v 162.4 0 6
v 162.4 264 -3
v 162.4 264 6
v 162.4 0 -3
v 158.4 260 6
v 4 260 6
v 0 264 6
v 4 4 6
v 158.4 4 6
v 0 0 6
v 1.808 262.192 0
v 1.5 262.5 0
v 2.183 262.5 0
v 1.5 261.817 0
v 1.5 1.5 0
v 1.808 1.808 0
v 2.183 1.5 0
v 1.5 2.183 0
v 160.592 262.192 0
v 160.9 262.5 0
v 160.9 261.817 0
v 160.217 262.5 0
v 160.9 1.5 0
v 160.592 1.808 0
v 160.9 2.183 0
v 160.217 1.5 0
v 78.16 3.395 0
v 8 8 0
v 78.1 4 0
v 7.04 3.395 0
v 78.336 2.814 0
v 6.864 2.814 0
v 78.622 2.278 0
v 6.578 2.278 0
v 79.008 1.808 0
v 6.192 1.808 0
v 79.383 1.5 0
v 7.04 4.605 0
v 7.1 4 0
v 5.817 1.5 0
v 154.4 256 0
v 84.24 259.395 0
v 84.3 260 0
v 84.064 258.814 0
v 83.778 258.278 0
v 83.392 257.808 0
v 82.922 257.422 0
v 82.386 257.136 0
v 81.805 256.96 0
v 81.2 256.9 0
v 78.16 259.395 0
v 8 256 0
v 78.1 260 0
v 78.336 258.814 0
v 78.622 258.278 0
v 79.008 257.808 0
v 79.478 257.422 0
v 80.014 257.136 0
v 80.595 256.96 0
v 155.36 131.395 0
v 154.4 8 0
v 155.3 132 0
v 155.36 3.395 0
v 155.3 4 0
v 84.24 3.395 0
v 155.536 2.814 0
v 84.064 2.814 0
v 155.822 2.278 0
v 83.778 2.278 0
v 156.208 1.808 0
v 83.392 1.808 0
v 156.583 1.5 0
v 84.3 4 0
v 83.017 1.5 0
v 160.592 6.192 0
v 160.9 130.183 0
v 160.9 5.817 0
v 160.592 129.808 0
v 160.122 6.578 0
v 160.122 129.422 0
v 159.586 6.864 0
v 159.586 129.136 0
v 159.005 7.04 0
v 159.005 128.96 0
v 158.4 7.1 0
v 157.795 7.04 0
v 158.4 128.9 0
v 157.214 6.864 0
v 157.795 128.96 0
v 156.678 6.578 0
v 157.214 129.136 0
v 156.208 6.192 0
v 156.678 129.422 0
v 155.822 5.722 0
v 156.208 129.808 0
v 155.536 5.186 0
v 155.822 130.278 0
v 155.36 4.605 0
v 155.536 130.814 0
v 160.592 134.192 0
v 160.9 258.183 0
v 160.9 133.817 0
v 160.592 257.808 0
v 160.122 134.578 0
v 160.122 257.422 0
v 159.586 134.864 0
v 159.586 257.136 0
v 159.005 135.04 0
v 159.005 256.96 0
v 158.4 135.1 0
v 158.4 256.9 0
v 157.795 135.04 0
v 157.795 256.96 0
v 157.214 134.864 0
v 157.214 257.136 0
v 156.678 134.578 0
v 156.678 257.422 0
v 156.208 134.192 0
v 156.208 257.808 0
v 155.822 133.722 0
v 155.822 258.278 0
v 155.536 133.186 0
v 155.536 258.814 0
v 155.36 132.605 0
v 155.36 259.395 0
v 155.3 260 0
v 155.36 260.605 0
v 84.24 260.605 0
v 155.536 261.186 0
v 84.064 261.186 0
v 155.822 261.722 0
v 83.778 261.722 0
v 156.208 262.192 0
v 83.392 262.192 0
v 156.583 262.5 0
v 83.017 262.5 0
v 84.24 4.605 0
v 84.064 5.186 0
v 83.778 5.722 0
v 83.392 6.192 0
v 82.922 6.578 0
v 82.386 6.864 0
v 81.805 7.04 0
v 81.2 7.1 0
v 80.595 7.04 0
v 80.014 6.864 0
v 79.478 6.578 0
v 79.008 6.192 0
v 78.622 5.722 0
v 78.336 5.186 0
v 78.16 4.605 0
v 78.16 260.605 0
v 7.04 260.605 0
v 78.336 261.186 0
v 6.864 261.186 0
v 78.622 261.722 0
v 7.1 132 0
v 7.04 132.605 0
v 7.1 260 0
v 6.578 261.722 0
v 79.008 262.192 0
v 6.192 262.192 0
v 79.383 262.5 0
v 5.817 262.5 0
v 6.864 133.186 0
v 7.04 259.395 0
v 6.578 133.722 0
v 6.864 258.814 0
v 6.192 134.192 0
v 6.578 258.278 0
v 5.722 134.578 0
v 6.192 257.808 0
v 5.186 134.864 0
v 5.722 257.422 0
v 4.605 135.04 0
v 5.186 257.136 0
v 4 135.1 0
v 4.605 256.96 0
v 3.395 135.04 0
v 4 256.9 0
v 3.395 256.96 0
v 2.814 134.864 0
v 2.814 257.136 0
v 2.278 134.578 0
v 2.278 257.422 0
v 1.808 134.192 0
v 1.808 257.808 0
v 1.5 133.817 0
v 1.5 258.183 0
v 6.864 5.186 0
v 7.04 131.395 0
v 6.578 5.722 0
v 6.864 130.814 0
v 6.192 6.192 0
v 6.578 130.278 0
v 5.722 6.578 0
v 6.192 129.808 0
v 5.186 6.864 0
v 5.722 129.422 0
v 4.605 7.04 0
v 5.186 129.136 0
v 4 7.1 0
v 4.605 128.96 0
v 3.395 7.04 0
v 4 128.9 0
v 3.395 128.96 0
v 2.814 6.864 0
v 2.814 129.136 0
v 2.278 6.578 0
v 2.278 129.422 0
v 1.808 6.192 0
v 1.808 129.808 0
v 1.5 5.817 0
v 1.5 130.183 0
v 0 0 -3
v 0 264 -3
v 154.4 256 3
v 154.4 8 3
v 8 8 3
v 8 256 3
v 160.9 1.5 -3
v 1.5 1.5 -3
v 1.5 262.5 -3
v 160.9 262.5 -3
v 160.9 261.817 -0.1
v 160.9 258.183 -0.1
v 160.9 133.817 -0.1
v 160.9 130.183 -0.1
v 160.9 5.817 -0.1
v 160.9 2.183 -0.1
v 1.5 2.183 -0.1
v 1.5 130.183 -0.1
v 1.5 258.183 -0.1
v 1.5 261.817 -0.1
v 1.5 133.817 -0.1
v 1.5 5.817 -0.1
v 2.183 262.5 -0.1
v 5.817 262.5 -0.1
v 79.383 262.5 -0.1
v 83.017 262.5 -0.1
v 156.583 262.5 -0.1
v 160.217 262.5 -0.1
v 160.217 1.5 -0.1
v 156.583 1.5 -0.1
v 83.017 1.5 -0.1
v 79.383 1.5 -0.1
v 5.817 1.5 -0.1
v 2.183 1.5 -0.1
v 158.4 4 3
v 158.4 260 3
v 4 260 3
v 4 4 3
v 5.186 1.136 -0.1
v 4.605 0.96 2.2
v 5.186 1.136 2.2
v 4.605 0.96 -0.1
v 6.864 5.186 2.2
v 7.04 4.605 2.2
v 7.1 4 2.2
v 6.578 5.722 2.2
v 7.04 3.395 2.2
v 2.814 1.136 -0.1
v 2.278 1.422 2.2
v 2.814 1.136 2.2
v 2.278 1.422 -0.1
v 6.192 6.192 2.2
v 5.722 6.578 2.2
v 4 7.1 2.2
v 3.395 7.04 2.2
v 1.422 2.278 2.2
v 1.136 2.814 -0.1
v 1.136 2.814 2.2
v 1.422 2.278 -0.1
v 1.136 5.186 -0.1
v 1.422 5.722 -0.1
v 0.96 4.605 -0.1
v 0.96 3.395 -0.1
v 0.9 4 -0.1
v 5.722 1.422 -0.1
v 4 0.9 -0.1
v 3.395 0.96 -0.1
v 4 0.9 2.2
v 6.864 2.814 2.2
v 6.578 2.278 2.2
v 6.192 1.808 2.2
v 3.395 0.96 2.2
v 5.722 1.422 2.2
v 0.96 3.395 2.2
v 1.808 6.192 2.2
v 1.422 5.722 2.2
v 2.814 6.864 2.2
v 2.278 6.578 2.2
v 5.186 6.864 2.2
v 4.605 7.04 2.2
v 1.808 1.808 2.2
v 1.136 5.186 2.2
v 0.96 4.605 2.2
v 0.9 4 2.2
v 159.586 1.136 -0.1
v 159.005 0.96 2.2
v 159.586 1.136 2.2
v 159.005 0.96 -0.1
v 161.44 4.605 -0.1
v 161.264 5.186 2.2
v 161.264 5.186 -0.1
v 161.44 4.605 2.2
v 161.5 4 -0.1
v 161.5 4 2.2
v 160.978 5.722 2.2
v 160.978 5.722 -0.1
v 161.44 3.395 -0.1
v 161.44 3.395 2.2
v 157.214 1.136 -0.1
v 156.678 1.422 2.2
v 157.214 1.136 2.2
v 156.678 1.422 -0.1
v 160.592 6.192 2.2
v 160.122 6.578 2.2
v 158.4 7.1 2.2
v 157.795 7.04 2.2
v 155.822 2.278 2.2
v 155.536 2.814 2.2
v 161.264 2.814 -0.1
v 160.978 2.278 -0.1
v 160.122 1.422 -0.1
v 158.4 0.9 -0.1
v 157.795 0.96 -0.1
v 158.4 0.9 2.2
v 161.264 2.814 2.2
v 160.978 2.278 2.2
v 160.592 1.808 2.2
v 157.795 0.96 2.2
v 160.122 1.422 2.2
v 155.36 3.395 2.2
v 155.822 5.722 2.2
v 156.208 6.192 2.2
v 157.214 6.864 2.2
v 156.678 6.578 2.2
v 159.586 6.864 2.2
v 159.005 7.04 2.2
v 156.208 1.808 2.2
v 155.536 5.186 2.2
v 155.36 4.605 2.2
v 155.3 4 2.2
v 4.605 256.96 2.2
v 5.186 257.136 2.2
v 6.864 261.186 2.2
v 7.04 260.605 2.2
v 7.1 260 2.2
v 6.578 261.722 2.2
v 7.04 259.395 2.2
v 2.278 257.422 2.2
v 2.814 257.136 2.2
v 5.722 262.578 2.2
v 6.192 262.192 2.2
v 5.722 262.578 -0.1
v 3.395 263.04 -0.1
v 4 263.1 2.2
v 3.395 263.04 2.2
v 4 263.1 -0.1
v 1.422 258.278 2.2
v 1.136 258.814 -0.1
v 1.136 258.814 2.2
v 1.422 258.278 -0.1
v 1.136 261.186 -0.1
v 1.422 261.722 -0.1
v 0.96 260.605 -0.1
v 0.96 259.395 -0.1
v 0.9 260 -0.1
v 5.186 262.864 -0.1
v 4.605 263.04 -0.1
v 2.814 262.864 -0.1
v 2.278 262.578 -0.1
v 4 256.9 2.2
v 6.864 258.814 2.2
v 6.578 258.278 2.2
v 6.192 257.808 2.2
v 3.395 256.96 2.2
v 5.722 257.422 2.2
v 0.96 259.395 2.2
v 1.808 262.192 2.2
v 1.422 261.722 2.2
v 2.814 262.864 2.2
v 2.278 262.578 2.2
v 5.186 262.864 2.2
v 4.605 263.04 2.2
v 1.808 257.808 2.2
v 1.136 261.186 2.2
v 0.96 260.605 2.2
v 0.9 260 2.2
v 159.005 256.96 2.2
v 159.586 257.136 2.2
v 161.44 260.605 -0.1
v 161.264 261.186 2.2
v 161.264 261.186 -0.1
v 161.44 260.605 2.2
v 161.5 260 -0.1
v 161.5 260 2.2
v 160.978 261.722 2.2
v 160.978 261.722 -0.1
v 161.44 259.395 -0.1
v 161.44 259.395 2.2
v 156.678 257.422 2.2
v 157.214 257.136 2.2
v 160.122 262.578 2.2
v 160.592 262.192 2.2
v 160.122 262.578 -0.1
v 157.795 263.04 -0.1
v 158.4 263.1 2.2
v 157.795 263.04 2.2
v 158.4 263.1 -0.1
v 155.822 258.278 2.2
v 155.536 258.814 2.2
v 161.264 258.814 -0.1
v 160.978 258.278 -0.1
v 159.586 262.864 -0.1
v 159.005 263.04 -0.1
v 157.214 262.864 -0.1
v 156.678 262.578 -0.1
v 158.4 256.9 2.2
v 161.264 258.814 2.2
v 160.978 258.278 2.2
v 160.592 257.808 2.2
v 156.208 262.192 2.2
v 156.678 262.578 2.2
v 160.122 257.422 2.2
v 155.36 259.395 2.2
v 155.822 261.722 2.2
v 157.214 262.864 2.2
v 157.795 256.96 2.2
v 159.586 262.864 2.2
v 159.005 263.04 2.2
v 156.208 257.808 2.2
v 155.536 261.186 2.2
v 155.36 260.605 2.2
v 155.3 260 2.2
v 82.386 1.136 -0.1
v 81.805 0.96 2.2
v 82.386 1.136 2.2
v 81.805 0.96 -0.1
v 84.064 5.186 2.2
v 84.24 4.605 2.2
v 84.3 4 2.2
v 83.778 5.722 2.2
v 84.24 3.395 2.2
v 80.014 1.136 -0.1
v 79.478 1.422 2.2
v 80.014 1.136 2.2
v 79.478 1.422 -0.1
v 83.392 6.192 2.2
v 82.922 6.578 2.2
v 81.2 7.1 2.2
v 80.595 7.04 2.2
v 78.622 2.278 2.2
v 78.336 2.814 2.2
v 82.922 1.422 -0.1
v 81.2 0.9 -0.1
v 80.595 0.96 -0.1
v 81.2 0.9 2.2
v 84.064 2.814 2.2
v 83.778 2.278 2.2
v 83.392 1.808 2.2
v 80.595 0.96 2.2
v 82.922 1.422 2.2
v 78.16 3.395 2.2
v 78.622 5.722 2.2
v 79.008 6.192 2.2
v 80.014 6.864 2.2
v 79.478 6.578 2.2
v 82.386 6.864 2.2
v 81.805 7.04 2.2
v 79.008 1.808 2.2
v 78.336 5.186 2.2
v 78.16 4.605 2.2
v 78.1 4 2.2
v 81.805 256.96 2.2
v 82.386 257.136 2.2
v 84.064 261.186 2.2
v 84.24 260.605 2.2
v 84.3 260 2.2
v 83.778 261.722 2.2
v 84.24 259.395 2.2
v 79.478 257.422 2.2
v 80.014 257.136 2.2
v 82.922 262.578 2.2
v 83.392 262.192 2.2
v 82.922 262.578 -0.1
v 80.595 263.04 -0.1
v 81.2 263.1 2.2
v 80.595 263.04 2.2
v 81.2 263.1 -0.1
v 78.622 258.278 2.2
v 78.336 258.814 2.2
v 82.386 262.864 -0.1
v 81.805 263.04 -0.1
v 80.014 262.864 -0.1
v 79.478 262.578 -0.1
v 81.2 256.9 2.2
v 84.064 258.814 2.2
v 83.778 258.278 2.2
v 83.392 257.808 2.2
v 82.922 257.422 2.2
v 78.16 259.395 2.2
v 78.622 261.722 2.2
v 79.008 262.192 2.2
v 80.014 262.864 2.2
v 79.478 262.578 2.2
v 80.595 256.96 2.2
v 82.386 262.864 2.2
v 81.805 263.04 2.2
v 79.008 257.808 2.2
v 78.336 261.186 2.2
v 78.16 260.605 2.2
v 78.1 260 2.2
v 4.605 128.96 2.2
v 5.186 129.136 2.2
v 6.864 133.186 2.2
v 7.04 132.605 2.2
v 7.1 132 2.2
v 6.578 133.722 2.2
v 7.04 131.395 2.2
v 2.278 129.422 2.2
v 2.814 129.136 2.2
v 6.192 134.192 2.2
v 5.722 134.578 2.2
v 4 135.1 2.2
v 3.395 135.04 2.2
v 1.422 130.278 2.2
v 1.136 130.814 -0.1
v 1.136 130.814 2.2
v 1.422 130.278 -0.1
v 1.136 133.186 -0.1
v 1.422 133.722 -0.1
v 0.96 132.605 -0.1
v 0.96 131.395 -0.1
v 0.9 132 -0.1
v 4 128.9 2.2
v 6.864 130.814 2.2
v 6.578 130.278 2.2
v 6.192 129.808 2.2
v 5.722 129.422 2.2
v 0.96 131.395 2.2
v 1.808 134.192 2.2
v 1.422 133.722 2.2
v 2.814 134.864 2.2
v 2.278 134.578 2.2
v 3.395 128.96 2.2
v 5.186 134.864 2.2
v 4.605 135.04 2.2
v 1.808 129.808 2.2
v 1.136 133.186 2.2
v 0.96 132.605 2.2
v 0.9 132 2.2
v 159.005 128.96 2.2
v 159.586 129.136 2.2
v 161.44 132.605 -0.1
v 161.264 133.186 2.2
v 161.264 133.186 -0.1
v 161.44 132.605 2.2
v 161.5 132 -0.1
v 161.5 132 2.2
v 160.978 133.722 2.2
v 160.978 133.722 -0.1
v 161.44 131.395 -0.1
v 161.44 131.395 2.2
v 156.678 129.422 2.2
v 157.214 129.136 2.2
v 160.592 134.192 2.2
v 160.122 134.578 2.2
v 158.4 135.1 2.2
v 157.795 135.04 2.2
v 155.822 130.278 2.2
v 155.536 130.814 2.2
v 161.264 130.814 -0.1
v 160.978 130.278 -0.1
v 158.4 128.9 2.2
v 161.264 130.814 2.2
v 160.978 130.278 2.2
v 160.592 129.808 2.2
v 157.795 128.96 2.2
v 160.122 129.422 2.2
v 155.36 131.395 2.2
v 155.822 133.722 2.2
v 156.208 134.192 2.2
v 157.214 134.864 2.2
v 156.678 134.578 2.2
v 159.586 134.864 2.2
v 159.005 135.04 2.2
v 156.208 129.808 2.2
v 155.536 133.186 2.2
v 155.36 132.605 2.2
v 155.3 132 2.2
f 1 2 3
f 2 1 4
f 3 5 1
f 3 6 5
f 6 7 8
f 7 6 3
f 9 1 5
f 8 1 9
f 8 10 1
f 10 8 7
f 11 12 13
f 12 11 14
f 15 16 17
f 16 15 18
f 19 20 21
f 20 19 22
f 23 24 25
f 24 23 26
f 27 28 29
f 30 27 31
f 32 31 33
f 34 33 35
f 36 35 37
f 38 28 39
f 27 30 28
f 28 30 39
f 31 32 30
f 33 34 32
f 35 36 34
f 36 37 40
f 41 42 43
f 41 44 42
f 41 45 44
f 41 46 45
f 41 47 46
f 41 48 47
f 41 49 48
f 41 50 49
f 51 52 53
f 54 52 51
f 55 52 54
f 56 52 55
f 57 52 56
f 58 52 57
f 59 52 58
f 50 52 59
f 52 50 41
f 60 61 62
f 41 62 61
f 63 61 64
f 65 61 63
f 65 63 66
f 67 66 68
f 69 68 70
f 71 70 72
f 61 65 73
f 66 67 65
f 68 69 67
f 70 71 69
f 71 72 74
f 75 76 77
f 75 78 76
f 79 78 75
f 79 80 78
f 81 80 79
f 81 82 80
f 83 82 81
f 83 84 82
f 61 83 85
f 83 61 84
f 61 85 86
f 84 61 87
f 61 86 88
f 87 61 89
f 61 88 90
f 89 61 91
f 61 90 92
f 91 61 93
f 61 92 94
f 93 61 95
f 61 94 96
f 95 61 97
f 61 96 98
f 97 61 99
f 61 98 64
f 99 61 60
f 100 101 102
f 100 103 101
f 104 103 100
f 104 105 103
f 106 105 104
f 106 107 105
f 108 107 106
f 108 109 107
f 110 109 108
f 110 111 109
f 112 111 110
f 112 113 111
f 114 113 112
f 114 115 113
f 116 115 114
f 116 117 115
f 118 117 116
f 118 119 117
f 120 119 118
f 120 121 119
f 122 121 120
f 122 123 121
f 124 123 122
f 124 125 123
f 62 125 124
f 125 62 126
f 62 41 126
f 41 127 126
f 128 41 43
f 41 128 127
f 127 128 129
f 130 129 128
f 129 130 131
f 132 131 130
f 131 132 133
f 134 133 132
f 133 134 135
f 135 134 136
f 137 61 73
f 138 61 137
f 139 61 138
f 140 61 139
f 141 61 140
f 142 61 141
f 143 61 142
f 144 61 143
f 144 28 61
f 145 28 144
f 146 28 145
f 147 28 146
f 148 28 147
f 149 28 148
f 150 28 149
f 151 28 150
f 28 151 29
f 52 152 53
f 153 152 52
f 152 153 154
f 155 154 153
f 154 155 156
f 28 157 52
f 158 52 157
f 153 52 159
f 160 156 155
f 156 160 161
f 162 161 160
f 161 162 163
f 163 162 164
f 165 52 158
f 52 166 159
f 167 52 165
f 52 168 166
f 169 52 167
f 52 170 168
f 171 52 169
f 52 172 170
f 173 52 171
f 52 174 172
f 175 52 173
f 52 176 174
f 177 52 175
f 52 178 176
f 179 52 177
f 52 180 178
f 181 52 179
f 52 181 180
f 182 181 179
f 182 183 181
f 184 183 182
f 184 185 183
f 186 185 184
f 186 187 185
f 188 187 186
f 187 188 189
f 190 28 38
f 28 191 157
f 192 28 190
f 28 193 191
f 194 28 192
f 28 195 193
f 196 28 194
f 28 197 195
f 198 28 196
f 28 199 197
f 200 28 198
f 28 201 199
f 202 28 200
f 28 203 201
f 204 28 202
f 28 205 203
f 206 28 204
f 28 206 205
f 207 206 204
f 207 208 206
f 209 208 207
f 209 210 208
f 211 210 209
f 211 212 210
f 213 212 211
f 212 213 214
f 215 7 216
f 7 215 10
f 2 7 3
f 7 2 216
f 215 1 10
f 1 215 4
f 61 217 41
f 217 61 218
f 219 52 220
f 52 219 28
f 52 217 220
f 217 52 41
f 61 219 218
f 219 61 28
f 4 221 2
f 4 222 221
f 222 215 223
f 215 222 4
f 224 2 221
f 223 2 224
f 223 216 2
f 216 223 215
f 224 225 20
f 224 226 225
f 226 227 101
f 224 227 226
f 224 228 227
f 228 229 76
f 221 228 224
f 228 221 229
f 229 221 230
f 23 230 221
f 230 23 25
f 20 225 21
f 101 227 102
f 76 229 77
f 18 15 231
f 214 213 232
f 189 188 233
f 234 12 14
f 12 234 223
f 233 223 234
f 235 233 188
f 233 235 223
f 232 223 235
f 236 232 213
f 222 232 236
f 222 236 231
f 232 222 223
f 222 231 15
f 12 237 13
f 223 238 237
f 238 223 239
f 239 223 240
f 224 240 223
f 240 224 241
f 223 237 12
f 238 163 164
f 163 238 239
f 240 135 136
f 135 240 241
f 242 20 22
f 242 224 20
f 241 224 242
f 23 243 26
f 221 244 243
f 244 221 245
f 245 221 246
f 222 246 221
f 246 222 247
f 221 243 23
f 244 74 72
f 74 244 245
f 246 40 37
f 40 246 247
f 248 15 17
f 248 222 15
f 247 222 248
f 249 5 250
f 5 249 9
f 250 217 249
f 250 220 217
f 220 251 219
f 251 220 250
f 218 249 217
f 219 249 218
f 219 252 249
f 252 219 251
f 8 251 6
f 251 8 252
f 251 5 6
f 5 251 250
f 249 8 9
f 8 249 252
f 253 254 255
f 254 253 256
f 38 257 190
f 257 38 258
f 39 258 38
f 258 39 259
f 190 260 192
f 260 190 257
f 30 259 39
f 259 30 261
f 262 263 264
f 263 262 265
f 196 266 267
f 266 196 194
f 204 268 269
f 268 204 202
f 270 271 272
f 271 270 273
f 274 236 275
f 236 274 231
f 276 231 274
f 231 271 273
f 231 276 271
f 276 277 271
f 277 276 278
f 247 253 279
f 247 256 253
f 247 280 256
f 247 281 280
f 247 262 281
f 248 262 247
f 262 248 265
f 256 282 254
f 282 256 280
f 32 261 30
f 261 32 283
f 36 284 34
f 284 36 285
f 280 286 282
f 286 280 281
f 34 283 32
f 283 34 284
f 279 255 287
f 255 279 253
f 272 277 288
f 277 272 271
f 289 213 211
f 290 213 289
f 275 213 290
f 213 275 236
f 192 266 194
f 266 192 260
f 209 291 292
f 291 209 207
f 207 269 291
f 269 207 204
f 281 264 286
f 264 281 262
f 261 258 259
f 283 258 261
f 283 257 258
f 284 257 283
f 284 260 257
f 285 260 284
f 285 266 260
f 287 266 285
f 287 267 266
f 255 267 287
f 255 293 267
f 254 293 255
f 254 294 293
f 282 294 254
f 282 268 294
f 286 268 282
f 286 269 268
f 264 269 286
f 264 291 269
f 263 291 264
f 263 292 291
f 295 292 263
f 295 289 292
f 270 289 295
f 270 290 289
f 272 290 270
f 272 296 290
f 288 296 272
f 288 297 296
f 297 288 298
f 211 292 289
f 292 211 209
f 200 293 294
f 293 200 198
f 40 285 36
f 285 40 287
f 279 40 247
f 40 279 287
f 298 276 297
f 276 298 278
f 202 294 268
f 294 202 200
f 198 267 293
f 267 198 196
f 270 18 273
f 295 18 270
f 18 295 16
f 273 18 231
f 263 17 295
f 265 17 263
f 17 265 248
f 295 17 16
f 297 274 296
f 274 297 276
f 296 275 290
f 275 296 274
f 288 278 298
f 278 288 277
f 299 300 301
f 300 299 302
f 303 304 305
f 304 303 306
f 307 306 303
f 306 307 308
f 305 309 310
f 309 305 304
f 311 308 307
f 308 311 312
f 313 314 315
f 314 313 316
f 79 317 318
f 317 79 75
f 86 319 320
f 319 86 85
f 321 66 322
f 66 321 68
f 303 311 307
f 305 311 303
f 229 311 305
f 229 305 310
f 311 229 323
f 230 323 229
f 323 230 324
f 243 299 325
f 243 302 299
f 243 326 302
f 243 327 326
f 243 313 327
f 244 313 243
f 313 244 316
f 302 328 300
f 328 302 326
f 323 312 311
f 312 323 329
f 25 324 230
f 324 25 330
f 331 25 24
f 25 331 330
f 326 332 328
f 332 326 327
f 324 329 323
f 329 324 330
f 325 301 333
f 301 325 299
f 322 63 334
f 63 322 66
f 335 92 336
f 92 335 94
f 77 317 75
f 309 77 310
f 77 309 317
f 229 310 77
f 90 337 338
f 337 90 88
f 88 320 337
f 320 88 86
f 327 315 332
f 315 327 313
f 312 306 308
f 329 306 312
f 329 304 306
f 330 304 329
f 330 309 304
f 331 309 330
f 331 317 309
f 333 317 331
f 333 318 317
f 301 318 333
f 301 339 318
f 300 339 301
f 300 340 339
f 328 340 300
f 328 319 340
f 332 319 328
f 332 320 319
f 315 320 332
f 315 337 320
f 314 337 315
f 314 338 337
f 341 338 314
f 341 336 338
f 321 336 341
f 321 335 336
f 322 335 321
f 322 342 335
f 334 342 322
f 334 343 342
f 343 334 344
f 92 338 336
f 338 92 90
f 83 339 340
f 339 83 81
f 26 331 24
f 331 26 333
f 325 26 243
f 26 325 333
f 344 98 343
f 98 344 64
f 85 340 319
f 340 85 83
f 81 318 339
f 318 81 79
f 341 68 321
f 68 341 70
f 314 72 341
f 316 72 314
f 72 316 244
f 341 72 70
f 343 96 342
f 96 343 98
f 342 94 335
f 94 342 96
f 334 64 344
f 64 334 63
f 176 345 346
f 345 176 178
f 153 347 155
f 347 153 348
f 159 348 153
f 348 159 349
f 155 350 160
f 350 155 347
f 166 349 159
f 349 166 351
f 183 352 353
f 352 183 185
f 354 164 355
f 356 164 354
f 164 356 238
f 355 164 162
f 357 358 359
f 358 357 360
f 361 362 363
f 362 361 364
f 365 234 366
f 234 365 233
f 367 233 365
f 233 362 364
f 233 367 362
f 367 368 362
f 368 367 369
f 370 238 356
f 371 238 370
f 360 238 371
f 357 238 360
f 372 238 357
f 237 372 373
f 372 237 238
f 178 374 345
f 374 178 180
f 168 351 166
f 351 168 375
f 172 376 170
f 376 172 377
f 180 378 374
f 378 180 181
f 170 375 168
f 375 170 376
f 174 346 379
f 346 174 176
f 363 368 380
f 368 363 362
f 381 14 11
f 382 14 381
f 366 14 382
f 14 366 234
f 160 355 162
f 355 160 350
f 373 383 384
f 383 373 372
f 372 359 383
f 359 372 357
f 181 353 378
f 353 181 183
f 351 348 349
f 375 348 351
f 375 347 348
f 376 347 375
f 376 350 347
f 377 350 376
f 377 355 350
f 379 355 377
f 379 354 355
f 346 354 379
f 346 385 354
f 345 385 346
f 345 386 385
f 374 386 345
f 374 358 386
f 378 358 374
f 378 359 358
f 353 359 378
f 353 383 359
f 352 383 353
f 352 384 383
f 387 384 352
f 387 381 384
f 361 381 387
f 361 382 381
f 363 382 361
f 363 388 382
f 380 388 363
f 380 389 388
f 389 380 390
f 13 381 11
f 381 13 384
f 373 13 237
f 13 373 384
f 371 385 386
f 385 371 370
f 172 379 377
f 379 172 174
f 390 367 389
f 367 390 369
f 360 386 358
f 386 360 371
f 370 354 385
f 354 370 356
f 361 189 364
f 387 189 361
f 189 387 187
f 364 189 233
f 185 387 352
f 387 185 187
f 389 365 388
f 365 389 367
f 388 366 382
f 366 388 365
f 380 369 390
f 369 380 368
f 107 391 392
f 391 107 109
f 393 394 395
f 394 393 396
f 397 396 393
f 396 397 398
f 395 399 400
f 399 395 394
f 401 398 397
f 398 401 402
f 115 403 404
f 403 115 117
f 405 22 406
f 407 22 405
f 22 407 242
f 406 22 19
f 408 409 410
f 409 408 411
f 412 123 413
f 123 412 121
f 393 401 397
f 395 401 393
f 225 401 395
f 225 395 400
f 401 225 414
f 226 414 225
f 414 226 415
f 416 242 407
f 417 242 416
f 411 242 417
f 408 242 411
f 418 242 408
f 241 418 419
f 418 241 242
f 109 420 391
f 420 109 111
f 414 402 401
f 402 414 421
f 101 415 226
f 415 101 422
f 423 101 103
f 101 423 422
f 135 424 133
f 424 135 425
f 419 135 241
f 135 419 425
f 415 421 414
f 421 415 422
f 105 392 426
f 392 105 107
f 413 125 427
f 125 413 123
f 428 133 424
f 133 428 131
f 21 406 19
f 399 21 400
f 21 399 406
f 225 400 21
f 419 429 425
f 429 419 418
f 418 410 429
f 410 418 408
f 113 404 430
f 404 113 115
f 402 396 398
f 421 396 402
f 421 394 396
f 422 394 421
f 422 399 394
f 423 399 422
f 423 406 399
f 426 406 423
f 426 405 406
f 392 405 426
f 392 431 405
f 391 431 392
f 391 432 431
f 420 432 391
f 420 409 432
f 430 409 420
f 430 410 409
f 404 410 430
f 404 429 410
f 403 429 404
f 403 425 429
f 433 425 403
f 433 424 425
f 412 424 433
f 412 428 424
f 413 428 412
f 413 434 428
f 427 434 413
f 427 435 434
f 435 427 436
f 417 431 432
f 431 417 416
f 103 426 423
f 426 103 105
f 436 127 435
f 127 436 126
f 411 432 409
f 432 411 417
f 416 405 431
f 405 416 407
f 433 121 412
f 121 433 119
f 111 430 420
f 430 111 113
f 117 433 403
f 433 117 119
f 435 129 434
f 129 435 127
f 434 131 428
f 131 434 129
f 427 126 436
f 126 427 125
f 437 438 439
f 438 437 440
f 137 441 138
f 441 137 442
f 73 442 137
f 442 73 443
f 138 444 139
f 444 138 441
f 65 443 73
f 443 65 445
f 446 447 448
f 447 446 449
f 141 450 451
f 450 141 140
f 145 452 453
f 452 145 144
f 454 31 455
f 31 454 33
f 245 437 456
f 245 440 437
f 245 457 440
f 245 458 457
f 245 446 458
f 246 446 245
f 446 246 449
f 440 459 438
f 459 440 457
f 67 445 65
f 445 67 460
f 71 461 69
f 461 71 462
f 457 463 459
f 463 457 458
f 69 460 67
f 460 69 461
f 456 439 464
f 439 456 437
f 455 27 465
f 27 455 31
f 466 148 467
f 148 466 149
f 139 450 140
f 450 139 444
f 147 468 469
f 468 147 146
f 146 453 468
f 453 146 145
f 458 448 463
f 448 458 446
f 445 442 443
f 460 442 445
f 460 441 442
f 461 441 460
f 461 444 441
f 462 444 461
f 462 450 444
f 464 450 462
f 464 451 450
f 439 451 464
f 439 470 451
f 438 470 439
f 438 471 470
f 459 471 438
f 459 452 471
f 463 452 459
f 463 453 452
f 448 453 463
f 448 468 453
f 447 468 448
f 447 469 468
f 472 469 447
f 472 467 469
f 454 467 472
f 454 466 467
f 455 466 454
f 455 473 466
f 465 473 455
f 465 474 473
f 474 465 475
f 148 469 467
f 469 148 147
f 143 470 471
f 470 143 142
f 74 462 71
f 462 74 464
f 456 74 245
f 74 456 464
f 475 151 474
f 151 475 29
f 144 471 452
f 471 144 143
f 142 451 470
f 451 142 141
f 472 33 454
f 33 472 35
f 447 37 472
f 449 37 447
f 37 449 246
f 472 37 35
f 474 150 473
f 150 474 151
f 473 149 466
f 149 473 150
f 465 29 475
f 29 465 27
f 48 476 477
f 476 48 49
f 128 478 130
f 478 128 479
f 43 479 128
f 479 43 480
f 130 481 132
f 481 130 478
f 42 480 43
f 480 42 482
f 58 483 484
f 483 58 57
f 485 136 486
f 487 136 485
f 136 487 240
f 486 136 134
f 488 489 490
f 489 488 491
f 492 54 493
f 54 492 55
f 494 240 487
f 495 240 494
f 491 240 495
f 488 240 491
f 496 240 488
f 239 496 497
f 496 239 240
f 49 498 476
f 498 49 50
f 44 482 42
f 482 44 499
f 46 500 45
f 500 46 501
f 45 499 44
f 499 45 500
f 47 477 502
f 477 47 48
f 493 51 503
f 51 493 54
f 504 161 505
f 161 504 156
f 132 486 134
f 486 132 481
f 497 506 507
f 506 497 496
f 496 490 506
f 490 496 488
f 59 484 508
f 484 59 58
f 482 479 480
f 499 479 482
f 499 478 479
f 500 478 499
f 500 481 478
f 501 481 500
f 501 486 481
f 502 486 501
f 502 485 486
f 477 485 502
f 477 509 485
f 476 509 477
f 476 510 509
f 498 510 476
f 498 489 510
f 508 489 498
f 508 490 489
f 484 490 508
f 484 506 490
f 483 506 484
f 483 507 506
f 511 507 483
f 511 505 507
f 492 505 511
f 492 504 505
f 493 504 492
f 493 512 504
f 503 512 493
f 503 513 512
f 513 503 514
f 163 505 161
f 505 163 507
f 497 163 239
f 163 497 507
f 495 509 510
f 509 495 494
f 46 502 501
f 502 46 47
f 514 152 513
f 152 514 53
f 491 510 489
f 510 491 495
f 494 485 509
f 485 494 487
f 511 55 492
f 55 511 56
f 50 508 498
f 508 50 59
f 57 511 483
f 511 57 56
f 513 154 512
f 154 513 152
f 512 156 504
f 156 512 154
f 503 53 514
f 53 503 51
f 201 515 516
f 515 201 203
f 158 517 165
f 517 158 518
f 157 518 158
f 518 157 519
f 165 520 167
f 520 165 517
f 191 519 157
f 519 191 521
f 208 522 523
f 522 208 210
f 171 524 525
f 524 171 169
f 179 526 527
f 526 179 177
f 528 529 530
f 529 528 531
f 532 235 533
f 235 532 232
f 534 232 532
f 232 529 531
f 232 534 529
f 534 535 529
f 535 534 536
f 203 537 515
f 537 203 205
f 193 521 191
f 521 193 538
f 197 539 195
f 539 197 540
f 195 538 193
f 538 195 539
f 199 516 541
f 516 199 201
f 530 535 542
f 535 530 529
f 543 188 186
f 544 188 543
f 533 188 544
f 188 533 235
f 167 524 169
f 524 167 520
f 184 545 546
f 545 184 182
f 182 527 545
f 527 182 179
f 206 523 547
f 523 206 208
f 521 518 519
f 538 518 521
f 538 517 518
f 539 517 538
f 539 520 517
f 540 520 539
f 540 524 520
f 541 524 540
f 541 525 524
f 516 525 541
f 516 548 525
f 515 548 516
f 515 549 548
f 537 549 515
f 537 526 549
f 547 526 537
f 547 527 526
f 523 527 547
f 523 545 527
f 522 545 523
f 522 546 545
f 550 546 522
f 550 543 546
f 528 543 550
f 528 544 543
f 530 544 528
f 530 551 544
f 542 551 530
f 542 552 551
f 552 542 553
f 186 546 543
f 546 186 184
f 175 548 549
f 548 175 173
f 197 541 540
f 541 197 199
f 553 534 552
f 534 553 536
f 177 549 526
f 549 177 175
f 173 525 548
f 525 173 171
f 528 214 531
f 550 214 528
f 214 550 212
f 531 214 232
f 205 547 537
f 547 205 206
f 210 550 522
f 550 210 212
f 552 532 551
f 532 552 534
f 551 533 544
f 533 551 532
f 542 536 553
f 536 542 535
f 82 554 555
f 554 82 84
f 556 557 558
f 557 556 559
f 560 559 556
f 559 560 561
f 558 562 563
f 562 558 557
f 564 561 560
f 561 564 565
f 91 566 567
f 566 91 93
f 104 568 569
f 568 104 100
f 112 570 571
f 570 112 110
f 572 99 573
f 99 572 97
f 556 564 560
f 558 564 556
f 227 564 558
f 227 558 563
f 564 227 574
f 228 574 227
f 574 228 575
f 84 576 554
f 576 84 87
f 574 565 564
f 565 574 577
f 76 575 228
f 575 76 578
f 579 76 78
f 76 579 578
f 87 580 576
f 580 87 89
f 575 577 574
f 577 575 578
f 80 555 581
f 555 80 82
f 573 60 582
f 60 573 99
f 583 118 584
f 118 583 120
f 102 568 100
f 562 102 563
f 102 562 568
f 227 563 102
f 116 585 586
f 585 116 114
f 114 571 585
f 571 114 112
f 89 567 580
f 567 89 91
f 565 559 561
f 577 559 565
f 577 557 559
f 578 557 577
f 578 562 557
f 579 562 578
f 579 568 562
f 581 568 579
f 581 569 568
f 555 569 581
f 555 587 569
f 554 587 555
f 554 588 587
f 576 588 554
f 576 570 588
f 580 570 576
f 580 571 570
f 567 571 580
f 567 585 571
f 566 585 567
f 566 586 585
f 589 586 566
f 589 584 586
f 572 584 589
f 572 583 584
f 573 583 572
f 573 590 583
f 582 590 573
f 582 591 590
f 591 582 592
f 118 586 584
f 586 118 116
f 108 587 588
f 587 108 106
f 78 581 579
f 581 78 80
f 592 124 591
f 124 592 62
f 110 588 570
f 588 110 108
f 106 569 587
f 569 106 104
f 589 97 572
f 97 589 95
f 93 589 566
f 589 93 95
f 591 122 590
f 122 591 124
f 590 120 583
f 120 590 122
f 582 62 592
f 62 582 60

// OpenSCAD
// file: common-params.scad
// VentShield — shared parametric dimensions
// All units in mm unless noted

// Frame geometry
frame_wall = 8;           // width of frame border
frame_thickness = 6;      // total frame height (z)
frame_overlap = 5;        // how far frame extends past vent opening per side

// Filter channel
channel_width = 4;        // slot width for filter insert
channel_depth = 3;        // slot depth from top face
channel_inset = 2;        // inset from inner frame edge

// Magnet pockets (N52 disc, 6mm x 2mm)
magnet_d = 6.2;           // slightly oversized for press-fit
magnet_h = 2.2;           // pocket depth (magnet flush or slightly recessed)
magnet_wall_min = 1.5;    // min material between magnet pocket and frame edge

// Living hinge
hinge_width = 12;         // width of hinge zone along fold line
hinge_thickness = 1.0;    // thin section for flex (TPU 95A)
hinge_gap = 0.6;          // relief cuts beside hinge for easier fold

// Friction grip lip
lip_height = 3;           // downward lip that grips register edge
lip_thickness = 1.5;      // wall thickness of grip lip
lip_taper = 0.5;          // inward taper for interference fit (mm total)

// Register dimensions (inches to mm conversion)
function in2mm(x) = x * 25.4;

// SKU definitions: [width_in, height_in, name, magnet_count]
sku_small  = [6, 10, "small",  8];
sku_medium = [6, 12, "medium", 8];
sku_large  = [12, 12, "large", 12];

// Tolerance
fit_tolerance = 0.3;      // general print tolerance
// main file
// VentShield — parametric vent filter frame
// Usage: set sku at bottom of file, render, export STL
// Print in TPU 95A, 0.2mm layers, 0.4mm nozzle

include <common-params.scad>

// --- Active SKU (change this to render different sizes) ---
active_sku = sku_small;  // sku_small, sku_medium, or sku_large

// --- Derived dimensions ---
vent_w = in2mm(active_sku[0]);
vent_h = in2mm(active_sku[1]);
sku_name = active_sku[2];
num_magnets = active_sku[3];

outer_w = vent_w + 2 * frame_overlap;
outer_h = vent_h + 2 * frame_overlap;

inner_w = vent_w - 2 * channel_inset;
inner_h = vent_h - 2 * channel_inset;

module magnet_pocket() {
    cylinder(d=magnet_d, h=magnet_h + 0.1, $fn=32);
}

module frame_body() {
    difference() {
        // Outer shell
        translate([0, 0, 0])
            cube([outer_w, outer_h, frame_thickness]);

        // Inner cutout (vent opening)
        translate([frame_wall, frame_wall, -0.1])
            cube([outer_w - 2*frame_wall, outer_h - 2*frame_wall, frame_thickness + 0.2]);
    }
}

module filter_channel() {
    // Channel around inner perimeter for filter insert
    cw = channel_width;
    cd = channel_depth;

    translate([frame_wall - cw, frame_wall - cw, frame_thickness - cd])
        difference() {
            cube([outer_w - 2*frame_wall + 2*cw, outer_h - 2*frame_wall + 2*cw, cd + 0.1]);
            translate([cw, cw, -0.1])
                cube([outer_w - 2*frame_wall, outer_h - 2*frame_wall, cd + 0.3]);
        }
}

module magnet_pockets() {
    mz = -0.1;  // pocket from bottom face
    inset = frame_wall / 2;

    // Corners
    positions_corners = [
        [inset, inset],
        [outer_w - inset, inset],
        [inset, outer_h - inset],
        [outer_w - inset, outer_h - inset]
    ];

    // Midpoints (long sides)
    positions_mid_h = [
        [outer_w / 2, inset],
        [outer_w / 2, outer_h - inset]
    ];

    // Midpoints (short sides) — only for 8+ magnets
    positions_mid_w = [
        [inset, outer_h / 2],
        [outer_w - inset, outer_h / 2]
    ];

    // Extra midpoints for large SKU (12 magnets)
    positions_extra = (num_magnets >= 12) ? [
        [outer_w / 3, inset],
        [2 * outer_w / 3, inset],
        [outer_w / 3, outer_h - inset],
        [2 * outer_w / 3, outer_h - inset]
    ] : [];

    all_positions = concat(positions_corners, positions_mid_h, positions_mid_w, positions_extra);

    for (i = [0 : min(num_magnets - 1, len(all_positions) - 1)]) {
        translate([all_positions[i][0], all_positions[i][1], mz])
            magnet_pocket();
    }
}

module friction_lip() {
    // Downward-facing lip around outer edge for gripping register frame
    lh = lip_height;
    lt = lip_thickness;

    difference() {
        translate([0, 0, -lh])
            cube([outer_w, outer_h, lh]);
        translate([lt, lt, -lh - 0.1])
            cube([outer_w - 2*lt, outer_h - 2*lt, lh + 0.2]);
    }

    // Inner taper for interference fit
    difference() {
        translate([lt - lip_taper, lt - lip_taper, -lh])
            cube([outer_w - 2*(lt - lip_taper), outer_h - 2*(lt - lip_taper), lh/2]);
        translate([lt, lt, -lh - 0.1])
            cube([outer_w - 2*lt, outer_h - 2*lt, lh + 0.2]);
    }
}

module living_hinges() {
    // Horizontal fold line at midpoint of height
    fold_y = outer_h / 2;

    // Cut relief channels beside hinge zones
    for (x_pos = [frame_wall, outer_w - frame_wall - hinge_width]) {
        // Left of hinge
        if (x_pos > frame_wall + hinge_gap) {
            translate([frame_wall, fold_y - hinge_gap/2, hinge_thickness])
                cube([x_pos - frame_wall - hinge_gap, hinge_gap, frame_thickness]);
        }
    }

    // Thin the frame at fold line (except at hinge zones)
    difference() {
        translate([0, fold_y - hinge_gap/2, hinge_thickness])
            cube([outer_w, hinge_gap, frame_thickness - hinge_thickness + 0.1]);

        // Keep material at hinge zones (corners and center)
        for (xp = [0, outer_w/2 - hinge_width/2, outer_w - hinge_width]) {
            translate([xp, fold_y - hinge_gap/2 - 0.1, -0.1])
                cube([hinge_width, hinge_gap + 0.2, frame_thickness + 0.2]);
        }
    }
}

// --- Assembly ---
module ventshield_frame() {
    color("DodgerBlue", 0.8)
    difference() {
        union() {
            frame_body();
            friction_lip();
        }
        filter_channel();
        magnet_pockets();
        living_hinges();
    }
}

// Render
ventshield_frame();

// Info echo
echo(str("VentShield ", sku_name, ": ", outer_w, "x", outer_h, "mm outer, ", num_magnets, " magnets"));
